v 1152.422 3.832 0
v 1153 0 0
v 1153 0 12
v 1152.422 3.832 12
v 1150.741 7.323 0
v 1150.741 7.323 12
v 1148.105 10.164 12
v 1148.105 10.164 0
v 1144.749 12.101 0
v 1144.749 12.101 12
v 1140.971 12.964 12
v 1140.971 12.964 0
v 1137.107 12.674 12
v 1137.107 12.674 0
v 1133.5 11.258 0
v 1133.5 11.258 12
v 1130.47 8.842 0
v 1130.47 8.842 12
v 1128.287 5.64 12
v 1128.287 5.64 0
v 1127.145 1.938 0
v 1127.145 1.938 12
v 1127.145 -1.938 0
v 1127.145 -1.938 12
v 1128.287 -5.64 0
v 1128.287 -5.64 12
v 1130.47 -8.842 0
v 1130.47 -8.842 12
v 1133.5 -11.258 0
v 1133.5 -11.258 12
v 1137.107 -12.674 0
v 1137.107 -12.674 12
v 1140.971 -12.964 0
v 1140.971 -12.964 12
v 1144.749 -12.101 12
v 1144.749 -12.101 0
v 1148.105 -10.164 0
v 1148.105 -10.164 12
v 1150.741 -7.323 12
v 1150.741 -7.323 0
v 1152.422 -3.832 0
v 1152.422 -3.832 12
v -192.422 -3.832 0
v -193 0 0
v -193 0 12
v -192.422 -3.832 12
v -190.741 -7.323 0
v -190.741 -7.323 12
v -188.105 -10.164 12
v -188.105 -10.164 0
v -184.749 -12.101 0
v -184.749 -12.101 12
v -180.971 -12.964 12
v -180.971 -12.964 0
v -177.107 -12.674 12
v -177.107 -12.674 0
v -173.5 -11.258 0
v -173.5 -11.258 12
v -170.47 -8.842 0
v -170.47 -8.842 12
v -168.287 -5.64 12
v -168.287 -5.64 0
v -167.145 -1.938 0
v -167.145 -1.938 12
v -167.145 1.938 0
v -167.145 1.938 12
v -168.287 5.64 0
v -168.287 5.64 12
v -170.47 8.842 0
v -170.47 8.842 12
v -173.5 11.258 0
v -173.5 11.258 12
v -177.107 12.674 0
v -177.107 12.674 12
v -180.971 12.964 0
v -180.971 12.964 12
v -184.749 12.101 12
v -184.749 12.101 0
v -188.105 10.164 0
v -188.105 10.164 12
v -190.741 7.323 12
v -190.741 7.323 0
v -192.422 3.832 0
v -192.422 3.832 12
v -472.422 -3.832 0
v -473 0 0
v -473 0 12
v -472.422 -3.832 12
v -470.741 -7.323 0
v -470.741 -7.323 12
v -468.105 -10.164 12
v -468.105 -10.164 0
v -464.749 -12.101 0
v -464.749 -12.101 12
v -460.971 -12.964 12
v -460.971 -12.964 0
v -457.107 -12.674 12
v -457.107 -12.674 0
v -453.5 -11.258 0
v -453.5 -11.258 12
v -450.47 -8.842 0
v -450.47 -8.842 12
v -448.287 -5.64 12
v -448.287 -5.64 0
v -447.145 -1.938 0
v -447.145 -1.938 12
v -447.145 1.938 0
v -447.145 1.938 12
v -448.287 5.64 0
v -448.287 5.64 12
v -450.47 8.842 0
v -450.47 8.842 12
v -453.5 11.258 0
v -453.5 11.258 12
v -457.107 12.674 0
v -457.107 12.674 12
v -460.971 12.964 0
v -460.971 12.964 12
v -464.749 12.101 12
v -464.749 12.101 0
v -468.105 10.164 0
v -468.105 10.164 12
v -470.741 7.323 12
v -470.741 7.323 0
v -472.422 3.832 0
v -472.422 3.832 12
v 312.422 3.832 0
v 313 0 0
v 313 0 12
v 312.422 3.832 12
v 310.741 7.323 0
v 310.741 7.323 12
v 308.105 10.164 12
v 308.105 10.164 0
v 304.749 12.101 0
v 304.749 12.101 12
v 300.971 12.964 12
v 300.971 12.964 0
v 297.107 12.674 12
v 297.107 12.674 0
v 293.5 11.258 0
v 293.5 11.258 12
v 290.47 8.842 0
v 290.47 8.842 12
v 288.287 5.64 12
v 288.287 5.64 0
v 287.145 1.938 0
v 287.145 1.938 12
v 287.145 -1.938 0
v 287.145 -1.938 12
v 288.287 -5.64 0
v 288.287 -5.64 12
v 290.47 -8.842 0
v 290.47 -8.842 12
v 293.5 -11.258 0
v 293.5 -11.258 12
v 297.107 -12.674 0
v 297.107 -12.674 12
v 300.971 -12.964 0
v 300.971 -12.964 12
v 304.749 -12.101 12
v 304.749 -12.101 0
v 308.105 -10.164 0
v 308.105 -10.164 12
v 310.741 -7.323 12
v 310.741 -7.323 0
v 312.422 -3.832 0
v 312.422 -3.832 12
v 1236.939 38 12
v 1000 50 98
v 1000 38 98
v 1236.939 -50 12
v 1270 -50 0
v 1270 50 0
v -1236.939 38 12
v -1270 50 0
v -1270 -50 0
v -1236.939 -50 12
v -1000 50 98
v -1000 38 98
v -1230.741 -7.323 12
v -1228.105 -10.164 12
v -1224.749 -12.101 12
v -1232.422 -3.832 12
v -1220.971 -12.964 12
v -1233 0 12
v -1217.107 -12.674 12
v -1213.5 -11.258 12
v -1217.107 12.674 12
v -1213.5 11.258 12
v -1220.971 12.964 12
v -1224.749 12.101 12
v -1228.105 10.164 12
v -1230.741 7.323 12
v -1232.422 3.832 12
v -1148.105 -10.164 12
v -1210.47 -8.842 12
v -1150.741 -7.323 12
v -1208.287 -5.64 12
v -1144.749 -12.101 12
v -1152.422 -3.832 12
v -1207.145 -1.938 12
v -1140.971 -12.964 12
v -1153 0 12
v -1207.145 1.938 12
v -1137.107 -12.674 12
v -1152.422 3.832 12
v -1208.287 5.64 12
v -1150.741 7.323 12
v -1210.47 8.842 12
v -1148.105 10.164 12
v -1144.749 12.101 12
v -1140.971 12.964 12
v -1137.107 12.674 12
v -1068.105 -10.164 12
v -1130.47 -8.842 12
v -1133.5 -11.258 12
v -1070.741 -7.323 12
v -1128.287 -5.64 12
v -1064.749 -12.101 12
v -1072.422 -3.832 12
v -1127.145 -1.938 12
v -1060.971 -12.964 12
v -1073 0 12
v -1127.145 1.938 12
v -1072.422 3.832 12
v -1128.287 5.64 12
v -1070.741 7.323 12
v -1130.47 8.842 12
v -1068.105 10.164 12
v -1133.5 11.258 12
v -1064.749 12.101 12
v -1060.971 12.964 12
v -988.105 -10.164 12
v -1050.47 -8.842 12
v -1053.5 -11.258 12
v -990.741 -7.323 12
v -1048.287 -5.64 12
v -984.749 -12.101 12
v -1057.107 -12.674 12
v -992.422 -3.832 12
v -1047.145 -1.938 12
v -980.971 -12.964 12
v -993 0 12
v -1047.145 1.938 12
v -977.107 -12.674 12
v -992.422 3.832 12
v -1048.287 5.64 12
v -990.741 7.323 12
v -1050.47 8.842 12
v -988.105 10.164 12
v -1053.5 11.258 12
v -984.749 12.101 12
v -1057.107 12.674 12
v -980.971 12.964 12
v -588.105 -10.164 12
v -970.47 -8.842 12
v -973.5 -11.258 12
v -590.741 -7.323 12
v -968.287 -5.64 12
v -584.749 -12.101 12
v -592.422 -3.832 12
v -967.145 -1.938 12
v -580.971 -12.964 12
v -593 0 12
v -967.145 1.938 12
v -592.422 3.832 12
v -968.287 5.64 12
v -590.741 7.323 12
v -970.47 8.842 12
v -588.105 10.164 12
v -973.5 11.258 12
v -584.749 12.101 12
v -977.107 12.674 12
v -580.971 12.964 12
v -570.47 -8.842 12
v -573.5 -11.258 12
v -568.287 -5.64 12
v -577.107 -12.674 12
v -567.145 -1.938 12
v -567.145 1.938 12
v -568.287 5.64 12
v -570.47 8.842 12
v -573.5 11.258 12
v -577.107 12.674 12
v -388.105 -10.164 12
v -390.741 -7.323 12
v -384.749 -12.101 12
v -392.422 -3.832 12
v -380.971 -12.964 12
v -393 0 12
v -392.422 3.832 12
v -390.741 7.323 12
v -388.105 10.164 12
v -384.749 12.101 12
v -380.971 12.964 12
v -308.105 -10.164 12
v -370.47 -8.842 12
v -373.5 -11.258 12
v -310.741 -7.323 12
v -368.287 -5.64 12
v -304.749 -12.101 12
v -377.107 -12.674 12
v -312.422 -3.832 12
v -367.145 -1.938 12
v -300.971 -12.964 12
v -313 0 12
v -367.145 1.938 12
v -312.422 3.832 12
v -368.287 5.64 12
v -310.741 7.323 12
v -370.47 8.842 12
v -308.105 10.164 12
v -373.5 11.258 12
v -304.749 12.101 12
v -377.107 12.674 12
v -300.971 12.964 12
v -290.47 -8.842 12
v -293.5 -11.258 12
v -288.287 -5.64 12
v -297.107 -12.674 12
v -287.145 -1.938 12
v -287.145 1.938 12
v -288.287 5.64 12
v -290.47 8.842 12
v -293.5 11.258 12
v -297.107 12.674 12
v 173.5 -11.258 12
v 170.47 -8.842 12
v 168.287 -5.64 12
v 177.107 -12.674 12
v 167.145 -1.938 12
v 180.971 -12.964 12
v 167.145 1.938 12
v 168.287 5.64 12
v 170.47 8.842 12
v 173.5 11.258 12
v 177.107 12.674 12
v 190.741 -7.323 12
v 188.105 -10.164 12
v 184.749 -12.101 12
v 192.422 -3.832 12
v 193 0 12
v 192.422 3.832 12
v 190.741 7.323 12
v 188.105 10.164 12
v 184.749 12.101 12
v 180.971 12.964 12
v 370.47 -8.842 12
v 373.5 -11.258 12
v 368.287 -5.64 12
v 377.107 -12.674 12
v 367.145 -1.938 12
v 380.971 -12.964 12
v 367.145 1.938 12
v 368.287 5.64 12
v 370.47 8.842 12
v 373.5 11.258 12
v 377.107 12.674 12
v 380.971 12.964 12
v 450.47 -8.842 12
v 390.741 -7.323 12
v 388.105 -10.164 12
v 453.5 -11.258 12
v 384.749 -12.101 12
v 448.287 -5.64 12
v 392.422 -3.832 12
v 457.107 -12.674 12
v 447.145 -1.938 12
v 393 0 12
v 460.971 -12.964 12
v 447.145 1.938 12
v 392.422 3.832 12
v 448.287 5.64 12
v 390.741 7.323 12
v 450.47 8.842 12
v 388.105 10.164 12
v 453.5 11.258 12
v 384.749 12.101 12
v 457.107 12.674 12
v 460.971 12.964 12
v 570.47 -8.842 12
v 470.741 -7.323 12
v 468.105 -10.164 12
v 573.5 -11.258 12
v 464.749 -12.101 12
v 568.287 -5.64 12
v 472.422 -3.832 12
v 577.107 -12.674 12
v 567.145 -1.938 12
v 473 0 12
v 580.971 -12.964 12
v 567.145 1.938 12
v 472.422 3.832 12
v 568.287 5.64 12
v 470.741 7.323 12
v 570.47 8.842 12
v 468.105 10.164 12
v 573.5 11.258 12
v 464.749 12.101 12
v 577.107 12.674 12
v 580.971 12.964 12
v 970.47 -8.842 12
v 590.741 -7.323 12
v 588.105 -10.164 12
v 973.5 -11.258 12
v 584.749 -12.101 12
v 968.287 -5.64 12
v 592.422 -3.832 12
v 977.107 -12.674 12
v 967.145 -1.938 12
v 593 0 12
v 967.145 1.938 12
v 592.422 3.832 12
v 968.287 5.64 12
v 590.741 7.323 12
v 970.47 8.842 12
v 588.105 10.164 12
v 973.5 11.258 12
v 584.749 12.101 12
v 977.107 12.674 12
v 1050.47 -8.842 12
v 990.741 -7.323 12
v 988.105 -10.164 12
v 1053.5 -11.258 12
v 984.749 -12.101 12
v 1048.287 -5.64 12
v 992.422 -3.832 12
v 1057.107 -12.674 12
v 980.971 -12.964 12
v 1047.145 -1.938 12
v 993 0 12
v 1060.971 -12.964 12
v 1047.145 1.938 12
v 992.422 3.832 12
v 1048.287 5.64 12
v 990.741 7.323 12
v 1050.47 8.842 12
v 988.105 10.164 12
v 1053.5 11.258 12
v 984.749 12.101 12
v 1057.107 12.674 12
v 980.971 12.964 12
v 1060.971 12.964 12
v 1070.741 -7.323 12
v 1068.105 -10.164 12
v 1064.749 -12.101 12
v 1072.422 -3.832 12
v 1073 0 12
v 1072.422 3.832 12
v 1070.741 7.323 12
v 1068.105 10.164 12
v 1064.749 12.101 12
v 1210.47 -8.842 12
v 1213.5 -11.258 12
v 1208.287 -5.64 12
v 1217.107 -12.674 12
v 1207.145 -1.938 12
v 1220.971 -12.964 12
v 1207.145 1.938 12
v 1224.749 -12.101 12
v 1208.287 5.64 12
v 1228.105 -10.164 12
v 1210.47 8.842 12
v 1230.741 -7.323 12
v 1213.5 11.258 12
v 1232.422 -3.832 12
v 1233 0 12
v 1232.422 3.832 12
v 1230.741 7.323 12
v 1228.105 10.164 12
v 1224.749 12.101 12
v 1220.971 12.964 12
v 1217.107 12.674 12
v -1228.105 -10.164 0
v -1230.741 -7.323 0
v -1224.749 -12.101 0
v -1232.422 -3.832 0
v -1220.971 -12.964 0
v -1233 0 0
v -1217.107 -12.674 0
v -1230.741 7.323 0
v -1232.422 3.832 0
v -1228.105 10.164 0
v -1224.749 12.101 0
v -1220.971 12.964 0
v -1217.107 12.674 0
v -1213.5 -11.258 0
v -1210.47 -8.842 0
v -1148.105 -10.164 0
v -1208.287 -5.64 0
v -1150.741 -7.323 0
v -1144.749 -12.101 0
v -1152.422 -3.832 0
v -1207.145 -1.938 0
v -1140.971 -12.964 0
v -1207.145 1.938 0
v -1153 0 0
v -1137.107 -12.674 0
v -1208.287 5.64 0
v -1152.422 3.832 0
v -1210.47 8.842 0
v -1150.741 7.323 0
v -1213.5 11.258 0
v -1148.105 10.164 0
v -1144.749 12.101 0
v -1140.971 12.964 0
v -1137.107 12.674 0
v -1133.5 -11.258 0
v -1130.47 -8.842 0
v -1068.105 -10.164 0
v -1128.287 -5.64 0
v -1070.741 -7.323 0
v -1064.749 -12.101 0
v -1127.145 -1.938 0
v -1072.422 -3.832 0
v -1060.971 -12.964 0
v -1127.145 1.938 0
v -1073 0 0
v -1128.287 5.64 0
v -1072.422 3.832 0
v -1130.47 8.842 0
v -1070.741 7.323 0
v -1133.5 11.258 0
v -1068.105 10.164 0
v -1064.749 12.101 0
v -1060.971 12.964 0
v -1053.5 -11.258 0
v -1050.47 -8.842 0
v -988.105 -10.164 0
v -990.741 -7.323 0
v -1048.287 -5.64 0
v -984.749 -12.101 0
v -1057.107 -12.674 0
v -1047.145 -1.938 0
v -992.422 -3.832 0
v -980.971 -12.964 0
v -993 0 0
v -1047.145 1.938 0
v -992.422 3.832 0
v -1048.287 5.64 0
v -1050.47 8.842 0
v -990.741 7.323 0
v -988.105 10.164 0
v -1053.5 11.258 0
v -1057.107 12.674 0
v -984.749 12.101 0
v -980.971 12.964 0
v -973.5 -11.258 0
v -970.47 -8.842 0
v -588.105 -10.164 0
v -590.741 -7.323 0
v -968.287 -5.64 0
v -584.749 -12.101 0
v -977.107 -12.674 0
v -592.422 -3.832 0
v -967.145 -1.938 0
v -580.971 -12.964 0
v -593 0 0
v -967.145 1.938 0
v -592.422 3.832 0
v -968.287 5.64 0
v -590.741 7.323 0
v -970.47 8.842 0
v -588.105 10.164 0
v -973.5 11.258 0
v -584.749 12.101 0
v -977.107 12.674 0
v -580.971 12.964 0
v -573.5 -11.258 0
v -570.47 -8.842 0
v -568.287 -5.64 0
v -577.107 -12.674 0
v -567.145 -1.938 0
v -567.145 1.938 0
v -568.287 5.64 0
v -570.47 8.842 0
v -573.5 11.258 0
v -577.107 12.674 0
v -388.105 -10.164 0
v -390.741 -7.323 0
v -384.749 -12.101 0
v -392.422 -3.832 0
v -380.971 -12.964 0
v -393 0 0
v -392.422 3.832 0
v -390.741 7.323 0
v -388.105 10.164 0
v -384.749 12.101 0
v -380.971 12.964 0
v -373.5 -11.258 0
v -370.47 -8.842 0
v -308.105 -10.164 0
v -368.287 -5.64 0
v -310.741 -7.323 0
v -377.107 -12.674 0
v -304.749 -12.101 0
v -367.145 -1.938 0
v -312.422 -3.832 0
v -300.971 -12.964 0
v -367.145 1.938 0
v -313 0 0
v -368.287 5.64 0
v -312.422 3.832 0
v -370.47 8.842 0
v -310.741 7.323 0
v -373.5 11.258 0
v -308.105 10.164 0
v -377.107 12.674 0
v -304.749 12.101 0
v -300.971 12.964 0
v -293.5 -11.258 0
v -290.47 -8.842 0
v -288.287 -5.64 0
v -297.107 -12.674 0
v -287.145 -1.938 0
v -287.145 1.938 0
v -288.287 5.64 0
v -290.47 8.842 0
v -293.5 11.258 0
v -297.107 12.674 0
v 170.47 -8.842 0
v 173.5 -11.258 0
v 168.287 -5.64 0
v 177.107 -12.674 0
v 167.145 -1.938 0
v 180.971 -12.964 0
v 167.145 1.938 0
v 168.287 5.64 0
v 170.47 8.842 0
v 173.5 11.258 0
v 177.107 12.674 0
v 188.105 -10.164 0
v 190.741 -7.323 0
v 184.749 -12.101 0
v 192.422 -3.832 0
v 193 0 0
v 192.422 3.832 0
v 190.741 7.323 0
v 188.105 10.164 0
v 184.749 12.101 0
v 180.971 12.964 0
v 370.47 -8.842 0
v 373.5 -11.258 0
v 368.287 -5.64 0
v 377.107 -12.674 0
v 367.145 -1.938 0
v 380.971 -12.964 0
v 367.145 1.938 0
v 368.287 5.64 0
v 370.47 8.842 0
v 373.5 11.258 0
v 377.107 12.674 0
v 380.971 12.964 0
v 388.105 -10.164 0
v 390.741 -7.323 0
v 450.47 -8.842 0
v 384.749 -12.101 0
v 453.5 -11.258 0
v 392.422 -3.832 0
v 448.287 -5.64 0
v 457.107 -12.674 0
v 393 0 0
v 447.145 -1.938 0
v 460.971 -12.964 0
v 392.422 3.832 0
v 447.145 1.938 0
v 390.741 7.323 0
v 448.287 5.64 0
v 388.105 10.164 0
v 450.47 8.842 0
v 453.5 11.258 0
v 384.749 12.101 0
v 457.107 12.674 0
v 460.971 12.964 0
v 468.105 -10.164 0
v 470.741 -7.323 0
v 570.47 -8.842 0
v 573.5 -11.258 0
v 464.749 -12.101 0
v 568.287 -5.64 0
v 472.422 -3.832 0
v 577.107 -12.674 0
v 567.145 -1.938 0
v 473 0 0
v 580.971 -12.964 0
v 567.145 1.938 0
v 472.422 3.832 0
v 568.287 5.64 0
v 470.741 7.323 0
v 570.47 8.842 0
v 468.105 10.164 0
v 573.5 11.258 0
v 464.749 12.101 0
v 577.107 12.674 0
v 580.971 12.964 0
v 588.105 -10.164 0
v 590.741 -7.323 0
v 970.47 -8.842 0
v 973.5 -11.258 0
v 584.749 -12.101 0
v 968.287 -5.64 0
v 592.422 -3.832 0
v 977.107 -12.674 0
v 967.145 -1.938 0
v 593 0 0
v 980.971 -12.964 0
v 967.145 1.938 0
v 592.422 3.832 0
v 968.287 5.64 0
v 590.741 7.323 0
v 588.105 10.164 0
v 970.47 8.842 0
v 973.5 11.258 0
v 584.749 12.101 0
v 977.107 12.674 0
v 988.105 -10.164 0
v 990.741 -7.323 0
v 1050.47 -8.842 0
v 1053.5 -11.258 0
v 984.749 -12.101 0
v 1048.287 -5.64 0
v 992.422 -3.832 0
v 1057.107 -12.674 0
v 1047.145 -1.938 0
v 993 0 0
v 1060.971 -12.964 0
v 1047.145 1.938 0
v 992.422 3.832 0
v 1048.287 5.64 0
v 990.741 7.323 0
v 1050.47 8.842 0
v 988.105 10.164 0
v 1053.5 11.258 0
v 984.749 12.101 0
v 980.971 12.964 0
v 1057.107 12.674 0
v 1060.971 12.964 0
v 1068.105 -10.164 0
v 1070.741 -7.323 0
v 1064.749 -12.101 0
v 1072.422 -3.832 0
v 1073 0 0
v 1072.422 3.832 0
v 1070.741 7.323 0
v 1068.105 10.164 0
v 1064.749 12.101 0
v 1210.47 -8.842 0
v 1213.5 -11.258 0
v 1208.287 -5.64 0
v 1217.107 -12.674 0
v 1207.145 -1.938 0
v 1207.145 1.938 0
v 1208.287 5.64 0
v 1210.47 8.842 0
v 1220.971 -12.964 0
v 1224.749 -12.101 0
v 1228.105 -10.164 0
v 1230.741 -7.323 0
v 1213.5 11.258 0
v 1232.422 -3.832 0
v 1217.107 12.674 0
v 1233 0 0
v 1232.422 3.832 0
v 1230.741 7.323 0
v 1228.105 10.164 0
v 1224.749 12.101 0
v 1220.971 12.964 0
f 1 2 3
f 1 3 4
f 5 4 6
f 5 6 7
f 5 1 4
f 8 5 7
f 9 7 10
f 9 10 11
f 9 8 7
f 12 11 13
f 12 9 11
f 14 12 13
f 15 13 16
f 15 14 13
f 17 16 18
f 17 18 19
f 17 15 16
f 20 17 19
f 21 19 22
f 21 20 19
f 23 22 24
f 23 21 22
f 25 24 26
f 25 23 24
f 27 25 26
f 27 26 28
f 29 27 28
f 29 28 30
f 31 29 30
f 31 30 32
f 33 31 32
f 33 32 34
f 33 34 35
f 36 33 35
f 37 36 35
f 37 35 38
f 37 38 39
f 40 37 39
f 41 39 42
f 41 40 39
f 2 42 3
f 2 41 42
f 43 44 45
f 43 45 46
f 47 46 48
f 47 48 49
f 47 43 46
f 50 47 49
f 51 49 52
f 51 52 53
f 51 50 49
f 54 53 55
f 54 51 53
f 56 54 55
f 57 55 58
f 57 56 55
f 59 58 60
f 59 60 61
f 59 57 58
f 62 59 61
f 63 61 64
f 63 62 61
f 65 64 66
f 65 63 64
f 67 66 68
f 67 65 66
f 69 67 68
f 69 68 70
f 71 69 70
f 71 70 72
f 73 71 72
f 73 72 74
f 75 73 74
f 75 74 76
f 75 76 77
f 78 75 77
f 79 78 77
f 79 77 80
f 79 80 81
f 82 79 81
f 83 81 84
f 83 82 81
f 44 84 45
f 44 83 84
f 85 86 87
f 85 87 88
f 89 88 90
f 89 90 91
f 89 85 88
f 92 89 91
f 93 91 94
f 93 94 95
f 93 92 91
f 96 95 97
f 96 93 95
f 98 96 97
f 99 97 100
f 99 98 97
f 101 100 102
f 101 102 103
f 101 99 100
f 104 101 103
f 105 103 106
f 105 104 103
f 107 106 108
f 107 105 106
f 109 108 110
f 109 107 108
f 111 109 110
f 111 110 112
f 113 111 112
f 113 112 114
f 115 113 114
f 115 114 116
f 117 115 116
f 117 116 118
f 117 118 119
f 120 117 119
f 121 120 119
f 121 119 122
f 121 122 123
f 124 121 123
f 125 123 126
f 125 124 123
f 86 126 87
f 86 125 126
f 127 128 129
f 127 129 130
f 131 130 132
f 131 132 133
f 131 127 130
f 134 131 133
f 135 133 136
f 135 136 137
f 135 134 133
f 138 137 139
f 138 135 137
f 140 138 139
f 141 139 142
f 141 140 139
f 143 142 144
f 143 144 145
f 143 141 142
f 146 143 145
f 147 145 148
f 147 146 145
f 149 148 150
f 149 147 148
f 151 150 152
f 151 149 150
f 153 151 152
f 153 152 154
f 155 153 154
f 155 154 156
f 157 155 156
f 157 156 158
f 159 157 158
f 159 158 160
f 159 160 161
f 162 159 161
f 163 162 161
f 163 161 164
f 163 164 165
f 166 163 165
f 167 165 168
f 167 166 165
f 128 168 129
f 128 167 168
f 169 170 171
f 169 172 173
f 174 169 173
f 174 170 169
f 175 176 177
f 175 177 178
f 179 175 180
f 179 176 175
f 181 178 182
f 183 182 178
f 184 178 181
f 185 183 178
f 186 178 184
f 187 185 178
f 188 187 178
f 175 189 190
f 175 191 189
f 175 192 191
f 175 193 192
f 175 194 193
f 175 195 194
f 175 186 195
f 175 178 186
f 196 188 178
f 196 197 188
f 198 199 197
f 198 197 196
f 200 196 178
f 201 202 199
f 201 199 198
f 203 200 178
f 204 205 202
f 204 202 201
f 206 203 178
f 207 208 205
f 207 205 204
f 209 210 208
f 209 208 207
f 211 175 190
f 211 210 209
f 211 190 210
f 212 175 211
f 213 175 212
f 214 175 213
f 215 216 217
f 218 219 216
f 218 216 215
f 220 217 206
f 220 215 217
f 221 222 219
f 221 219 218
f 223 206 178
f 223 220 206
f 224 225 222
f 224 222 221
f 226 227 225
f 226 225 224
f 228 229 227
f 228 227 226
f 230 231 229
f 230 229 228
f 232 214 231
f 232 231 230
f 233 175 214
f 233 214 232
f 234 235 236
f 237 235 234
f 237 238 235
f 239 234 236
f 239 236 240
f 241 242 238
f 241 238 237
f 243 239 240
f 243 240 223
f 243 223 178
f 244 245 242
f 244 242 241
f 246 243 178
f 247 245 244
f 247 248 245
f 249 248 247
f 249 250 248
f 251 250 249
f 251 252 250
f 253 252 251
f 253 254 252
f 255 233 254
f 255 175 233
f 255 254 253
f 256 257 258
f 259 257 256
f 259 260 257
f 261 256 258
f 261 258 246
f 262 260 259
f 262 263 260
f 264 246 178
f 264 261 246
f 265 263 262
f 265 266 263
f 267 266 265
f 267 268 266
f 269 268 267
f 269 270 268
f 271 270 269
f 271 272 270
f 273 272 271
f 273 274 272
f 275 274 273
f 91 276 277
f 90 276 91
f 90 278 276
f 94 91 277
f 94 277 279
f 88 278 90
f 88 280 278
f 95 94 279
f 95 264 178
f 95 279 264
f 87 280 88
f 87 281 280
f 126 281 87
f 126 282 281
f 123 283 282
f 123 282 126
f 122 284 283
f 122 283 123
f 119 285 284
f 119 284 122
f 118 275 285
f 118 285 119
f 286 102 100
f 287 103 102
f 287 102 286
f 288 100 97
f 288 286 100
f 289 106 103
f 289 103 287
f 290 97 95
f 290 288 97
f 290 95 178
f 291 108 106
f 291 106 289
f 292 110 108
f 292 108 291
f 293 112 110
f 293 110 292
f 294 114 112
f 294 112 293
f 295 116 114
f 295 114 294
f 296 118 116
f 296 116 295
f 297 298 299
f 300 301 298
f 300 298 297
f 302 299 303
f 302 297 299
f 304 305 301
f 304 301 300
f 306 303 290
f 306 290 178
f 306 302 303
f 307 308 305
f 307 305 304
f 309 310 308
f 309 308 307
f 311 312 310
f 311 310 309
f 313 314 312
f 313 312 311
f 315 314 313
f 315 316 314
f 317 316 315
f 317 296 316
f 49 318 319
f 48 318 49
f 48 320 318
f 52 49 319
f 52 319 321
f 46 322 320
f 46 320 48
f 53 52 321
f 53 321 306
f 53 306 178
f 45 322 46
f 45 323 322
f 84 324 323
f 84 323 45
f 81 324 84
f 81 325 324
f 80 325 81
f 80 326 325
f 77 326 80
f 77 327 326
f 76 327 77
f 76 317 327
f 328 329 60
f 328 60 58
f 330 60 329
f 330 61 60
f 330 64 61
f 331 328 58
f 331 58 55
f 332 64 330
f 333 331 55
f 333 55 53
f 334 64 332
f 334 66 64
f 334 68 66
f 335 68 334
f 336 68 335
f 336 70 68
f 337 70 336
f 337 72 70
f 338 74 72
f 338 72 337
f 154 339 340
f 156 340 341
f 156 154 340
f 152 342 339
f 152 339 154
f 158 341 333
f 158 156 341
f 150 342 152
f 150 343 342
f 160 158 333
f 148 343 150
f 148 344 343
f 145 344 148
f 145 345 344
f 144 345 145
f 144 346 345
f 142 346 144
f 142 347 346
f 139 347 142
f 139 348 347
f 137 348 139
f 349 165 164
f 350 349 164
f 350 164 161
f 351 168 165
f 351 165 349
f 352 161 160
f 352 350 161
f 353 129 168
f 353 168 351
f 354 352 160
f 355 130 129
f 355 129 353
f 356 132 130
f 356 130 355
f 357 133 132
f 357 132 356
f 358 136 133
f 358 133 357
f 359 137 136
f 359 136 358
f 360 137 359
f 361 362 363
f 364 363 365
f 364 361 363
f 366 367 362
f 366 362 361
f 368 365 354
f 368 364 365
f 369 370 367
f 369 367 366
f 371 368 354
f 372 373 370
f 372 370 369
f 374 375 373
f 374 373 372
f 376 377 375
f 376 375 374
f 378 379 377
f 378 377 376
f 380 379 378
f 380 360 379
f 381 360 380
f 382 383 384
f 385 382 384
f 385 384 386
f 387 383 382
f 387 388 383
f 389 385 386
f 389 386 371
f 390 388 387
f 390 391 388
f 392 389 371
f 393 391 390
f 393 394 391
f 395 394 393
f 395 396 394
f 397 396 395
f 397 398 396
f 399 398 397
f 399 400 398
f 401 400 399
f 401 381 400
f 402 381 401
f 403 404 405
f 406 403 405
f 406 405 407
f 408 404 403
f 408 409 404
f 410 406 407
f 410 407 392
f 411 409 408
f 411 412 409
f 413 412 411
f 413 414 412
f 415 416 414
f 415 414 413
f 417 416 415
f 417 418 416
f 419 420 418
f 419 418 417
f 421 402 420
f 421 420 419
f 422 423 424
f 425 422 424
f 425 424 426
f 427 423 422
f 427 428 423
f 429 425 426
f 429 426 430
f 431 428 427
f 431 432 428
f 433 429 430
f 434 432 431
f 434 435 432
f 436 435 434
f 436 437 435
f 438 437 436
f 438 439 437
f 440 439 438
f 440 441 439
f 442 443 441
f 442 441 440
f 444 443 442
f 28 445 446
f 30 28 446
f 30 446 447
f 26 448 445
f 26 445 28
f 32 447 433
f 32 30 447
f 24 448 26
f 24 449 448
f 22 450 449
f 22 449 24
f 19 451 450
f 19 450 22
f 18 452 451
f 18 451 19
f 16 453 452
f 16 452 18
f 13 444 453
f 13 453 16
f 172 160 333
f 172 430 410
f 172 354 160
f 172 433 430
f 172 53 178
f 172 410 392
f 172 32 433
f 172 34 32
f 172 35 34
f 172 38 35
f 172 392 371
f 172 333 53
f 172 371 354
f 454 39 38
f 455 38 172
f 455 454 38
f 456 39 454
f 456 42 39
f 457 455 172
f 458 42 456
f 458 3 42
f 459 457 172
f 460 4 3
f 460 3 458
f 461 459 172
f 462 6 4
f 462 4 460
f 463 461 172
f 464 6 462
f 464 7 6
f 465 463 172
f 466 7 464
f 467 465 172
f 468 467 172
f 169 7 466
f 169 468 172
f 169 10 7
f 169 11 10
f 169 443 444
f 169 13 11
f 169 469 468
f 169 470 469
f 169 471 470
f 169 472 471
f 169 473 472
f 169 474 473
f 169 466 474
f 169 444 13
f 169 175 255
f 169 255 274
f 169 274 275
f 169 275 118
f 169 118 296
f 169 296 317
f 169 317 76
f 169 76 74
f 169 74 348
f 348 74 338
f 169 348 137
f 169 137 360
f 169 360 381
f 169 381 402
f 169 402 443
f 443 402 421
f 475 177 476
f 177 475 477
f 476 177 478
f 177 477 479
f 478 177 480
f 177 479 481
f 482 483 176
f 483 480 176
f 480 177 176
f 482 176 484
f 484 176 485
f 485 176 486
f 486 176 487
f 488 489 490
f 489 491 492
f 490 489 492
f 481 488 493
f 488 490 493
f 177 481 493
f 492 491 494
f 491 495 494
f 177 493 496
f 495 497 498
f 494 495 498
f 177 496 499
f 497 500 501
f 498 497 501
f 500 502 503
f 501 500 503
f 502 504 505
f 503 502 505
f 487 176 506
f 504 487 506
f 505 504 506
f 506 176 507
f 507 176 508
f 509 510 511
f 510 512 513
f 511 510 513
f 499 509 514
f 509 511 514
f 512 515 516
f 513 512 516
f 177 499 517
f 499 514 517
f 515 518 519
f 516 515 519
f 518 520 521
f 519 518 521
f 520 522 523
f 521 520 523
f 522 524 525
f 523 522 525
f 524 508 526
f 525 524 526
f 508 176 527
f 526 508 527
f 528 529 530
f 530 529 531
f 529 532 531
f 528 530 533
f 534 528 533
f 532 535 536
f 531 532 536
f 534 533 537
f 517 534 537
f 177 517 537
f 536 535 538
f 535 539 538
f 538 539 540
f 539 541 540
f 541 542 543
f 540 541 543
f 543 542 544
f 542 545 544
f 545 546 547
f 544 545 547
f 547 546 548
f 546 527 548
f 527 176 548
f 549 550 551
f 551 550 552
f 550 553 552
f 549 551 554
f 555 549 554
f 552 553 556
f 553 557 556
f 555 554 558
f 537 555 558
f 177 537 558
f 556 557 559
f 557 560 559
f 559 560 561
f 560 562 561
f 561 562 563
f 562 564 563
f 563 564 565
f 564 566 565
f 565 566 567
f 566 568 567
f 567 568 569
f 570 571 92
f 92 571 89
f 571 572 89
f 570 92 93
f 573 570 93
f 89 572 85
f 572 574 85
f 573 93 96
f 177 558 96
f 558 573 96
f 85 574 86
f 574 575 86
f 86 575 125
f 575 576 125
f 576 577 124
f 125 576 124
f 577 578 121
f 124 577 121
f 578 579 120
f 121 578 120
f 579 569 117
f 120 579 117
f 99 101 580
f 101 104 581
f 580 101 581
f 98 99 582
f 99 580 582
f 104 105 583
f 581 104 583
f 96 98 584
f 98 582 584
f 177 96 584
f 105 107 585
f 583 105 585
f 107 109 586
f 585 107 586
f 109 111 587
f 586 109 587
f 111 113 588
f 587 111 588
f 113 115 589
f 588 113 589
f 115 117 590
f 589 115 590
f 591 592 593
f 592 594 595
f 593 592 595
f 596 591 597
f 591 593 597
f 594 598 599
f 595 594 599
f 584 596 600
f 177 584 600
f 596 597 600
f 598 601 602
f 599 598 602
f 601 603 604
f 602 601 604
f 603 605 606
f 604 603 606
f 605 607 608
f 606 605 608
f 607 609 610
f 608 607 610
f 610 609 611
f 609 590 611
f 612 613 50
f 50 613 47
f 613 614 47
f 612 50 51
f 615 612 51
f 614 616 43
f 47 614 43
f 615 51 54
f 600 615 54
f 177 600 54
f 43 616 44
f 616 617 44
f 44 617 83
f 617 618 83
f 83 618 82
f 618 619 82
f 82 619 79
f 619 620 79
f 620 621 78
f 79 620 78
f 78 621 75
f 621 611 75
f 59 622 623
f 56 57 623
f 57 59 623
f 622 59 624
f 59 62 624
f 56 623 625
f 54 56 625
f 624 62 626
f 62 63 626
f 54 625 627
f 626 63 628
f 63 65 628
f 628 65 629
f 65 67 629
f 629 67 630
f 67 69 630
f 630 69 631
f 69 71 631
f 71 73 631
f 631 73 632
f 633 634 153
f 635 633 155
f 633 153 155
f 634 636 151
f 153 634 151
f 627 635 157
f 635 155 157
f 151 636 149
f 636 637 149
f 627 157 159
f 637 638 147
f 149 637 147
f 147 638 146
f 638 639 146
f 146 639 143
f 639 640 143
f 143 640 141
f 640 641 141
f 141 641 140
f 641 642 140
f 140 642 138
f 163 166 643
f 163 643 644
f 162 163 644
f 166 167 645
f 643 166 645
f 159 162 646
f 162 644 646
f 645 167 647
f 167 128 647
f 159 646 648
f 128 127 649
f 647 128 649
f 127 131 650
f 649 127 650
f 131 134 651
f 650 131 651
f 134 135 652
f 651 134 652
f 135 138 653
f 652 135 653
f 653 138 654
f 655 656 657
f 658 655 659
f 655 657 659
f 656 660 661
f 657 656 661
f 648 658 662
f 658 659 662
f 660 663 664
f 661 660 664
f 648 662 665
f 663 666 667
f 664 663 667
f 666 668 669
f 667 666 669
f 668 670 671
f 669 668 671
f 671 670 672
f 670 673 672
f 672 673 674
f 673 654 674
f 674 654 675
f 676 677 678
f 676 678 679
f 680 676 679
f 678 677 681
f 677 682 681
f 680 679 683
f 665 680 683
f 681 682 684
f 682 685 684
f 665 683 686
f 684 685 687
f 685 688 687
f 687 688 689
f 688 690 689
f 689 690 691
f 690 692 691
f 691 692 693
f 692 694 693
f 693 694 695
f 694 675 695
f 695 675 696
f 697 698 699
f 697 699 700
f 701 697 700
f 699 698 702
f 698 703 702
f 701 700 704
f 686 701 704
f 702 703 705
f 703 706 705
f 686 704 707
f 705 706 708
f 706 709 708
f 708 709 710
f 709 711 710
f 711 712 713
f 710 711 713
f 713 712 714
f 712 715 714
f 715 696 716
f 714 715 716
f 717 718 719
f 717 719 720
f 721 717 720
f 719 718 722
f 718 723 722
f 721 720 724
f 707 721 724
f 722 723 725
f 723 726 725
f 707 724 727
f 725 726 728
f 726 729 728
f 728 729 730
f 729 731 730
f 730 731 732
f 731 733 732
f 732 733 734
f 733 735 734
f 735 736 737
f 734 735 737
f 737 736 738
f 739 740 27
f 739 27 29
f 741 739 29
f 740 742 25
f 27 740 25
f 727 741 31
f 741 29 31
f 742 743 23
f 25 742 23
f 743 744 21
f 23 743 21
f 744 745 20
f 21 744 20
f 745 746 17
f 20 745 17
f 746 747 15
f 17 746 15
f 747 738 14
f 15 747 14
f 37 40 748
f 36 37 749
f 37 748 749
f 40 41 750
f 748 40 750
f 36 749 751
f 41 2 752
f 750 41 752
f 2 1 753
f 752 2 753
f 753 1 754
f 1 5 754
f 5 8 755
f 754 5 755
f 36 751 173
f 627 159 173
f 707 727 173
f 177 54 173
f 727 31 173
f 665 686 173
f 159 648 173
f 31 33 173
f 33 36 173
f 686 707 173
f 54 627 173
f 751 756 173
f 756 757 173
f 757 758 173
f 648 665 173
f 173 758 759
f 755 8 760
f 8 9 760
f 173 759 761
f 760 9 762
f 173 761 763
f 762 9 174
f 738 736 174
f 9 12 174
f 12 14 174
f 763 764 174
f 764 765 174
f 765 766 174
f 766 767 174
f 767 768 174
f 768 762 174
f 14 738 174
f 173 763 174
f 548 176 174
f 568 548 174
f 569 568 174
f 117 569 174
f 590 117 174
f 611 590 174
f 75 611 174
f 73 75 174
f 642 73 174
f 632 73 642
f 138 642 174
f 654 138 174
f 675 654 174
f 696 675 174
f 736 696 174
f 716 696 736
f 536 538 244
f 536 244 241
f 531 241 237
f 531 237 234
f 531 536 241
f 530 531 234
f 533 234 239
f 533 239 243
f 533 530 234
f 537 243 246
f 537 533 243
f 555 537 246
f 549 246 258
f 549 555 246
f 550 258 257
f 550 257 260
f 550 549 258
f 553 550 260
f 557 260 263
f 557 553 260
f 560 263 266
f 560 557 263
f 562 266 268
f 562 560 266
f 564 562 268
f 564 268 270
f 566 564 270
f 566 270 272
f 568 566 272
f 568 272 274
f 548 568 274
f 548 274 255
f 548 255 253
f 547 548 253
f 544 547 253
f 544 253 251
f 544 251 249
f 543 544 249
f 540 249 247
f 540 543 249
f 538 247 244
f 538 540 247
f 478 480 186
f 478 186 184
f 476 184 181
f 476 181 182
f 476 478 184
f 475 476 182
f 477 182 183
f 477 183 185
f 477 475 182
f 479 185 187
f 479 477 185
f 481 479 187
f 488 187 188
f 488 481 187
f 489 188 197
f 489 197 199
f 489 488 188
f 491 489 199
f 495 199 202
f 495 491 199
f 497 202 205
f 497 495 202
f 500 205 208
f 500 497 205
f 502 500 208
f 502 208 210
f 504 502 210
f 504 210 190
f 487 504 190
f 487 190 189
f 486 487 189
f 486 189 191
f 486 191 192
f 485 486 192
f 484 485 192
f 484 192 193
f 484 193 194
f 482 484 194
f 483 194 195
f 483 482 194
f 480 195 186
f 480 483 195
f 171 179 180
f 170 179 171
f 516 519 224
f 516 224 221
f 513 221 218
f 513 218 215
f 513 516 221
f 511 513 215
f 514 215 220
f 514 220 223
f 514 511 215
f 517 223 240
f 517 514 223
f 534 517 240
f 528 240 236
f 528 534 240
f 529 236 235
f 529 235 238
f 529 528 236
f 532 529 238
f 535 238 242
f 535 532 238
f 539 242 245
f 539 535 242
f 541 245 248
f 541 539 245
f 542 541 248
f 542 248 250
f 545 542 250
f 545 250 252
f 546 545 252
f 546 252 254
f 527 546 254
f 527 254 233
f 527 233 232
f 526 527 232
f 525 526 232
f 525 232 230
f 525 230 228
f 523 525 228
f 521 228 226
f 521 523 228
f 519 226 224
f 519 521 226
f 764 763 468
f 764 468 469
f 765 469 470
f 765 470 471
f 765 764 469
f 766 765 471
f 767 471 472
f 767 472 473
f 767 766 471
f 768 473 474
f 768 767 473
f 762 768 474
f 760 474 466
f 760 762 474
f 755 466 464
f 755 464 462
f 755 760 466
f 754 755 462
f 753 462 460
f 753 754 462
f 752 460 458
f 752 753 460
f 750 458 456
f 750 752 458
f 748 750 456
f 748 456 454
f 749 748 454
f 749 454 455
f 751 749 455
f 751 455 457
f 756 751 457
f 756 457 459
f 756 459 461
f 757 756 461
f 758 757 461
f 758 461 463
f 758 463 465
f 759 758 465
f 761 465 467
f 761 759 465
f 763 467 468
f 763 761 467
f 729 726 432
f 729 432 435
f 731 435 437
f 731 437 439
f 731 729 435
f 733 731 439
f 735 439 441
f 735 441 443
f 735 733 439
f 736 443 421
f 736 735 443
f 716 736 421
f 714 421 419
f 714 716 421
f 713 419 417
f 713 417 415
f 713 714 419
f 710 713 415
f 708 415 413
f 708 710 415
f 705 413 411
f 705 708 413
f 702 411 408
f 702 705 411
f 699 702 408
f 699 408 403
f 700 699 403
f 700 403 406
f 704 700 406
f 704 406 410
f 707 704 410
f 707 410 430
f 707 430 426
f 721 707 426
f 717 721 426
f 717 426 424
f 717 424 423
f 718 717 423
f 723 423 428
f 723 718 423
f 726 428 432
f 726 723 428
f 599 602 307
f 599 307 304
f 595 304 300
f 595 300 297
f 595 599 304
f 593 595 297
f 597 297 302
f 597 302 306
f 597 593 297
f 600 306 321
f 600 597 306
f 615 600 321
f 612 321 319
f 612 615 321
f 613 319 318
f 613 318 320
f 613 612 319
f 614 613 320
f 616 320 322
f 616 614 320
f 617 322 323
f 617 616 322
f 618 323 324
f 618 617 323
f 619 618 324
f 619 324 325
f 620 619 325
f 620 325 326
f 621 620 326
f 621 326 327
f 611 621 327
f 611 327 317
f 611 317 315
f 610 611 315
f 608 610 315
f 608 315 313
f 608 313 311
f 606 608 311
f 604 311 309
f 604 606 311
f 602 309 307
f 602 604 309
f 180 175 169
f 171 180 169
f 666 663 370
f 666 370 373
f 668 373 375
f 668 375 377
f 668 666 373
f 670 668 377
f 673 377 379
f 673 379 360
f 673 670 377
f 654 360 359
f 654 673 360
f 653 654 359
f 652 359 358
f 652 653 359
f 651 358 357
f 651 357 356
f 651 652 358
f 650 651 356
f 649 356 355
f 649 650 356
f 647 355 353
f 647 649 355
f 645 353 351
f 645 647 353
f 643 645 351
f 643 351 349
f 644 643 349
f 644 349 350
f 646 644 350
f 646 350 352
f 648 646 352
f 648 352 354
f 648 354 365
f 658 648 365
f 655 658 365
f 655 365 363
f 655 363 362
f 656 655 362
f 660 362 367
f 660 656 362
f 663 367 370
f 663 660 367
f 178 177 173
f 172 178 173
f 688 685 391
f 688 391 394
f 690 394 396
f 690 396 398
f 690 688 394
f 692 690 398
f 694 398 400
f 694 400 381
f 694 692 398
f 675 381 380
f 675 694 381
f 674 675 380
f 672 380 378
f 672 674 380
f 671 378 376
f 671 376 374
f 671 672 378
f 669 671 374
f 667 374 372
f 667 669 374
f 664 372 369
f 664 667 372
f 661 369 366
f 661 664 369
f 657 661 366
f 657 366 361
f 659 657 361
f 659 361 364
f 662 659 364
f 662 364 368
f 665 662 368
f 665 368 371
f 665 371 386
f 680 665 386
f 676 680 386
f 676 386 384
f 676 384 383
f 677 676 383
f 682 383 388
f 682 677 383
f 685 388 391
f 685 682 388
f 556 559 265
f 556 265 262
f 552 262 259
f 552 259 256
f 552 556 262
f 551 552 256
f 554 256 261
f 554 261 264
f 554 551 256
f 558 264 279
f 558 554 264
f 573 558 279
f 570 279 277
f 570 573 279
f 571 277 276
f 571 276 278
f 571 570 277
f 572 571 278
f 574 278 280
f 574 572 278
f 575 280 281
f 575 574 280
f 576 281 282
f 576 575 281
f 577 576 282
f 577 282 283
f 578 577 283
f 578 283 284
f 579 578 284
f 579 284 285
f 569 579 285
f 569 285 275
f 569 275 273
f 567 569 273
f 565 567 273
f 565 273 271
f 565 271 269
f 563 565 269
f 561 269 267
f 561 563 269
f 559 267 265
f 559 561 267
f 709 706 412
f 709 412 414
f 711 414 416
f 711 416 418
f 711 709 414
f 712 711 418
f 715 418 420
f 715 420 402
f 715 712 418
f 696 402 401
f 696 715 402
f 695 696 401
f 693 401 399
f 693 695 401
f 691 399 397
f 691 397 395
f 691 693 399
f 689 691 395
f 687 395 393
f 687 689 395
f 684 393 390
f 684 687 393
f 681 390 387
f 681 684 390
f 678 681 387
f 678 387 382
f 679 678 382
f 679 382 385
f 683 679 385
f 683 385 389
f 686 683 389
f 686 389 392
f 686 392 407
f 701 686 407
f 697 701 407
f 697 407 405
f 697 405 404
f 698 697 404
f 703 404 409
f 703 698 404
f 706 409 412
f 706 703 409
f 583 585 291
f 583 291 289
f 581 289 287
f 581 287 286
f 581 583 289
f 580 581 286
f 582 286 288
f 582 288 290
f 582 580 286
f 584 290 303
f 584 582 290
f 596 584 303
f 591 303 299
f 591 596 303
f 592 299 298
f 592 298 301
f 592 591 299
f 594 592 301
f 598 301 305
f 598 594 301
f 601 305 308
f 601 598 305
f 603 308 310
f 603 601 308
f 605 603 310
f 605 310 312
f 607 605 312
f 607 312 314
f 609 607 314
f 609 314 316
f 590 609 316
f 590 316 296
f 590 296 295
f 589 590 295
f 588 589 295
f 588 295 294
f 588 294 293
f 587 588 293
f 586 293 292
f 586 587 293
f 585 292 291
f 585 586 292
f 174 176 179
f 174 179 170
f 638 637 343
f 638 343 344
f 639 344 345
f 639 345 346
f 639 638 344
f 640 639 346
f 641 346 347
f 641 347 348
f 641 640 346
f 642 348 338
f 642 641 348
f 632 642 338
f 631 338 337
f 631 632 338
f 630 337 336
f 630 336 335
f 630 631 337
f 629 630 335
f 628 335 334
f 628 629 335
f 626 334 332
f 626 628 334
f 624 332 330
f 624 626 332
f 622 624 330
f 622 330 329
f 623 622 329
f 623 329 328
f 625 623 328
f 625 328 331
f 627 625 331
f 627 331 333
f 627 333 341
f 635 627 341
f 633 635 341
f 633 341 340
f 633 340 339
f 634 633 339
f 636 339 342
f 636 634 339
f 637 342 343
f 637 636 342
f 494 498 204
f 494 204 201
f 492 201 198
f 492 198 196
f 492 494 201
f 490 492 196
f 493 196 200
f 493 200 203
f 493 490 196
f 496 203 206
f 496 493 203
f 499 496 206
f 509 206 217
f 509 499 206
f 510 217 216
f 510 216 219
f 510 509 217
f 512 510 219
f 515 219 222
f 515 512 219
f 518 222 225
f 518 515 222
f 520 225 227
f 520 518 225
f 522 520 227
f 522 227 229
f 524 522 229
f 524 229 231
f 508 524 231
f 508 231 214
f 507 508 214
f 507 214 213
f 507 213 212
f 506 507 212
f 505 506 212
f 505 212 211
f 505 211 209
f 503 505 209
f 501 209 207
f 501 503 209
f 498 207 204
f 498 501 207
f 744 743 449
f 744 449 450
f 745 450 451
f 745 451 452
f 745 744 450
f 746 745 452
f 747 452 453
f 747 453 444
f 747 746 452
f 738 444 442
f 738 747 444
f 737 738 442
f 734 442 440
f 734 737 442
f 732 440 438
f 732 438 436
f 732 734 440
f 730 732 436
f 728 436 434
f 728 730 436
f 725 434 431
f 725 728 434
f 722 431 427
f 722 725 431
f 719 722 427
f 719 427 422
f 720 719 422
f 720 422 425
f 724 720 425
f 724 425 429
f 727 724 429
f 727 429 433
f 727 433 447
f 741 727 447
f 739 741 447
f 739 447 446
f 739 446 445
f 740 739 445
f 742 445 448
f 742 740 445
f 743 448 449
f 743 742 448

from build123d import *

# Parameters (mm, degrees)
SKETCH_1_W          = 2540
SKETCH_1_H          = 100
SKETCH_1_R          = 13
EXTRUDE_525_DEPTH   = 12
SKETCH_2_W          = 2540
SKETCH_2_H          = 12
EXTRUDE_1_DEPTH     = 86
CUT_EXTRUDE_1_DEPTH = 1278.694799238


with BuildPart() as part:
    # 草图1 → Extrude 525 (new body)
    with BuildSketch(Plane.XY):
        Rectangle(SKETCH_1_W, SKETCH_1_H)
        with Locations((1220, 0)):
            Circle(SKETCH_1_R, mode=Mode.SUBTRACT)
        with Locations((1140, 0)):
            Circle(SKETCH_1_R, mode=Mode.SUBTRACT)
        with Locations((1060, 0)):
            Circle(SKETCH_1_R, mode=Mode.SUBTRACT)
        with Locations((980, 0)):
            Circle(SKETCH_1_R, mode=Mode.SUBTRACT)
        with Locations((580, 0)):
            Circle(SKETCH_1_R, mode=Mode.SUBTRACT)
        with Locations((460, 0)):
            Circle(SKETCH_1_R, mode=Mode.SUBTRACT)
        with Locations((380, 0)):
            Circle(SKETCH_1_R, mode=Mode.SUBTRACT)
        with Locations((300, 0)):
            Circle(SKETCH_1_R, mode=Mode.SUBTRACT)
        with Locations((180, 0)):
            Circle(SKETCH_1_R, mode=Mode.SUBTRACT)
        with Locations(Location((-180, 0, 0), (0, 0, 180))):
            Circle(SKETCH_1_R, mode=Mode.SUBTRACT)
        with Locations(Location((-300, 0, 0), (0, 0, 180))):
            Circle(SKETCH_1_R, mode=Mode.SUBTRACT)
        with Locations(Location((-380, 0, 0), (0, 0, 180))):
            Circle(SKETCH_1_R, mode=Mode.SUBTRACT)
        with Locations(Location((-460, 0, 0), (0, 0, 180))):
            Circle(SKETCH_1_R, mode=Mode.SUBTRACT)
        with Locations(Location((-580, 0, 0), (0, 0, 180))):
            Circle(SKETCH_1_R, mode=Mode.SUBTRACT)
        with Locations(Location((-980, 0, 0), (0, 0, 180))):
            Circle(SKETCH_1_R, mode=Mode.SUBTRACT)
        with Locations(Location((-1060, 0, 0), (0, 0, 180))):
            Circle(SKETCH_1_R, mode=Mode.SUBTRACT)
        with Locations(Location((-1140, 0, 0), (0, 0, 180))):
            Circle(SKETCH_1_R, mode=Mode.SUBTRACT)
        with Locations(Location((-1220, 0, 0), (0, 0, 180))):
            Circle(SKETCH_1_R, mode=Mode.SUBTRACT)
    extrude(amount=EXTRUDE_525_DEPTH)

    # 草图2 → 凸台-拉伸1 (add)
    with BuildSketch(Plane.XY.offset(12)):
        with Locations((0, 44)):
            Rectangle(SKETCH_2_W, SKETCH_2_H)
    extrude(amount=EXTRUDE_1_DEPTH)

    # 草图4 → 切除-拉伸1 (cut, through all)
    with BuildSketch(Plane(origin=(0, 50, 0), x_dir=(-1, 0, 0), z_dir=(0, 1, 0))):
        Polygon((-1270, 0), (-1270, 98), (-1000, 98), align=None)
        Polygon((1270, 0), (1000, 98), (1270, 98), align=None)
    extrude(amount=-CUT_EXTRUDE_1_DEPTH, mode=Mode.SUBTRACT)


solid = part.part
